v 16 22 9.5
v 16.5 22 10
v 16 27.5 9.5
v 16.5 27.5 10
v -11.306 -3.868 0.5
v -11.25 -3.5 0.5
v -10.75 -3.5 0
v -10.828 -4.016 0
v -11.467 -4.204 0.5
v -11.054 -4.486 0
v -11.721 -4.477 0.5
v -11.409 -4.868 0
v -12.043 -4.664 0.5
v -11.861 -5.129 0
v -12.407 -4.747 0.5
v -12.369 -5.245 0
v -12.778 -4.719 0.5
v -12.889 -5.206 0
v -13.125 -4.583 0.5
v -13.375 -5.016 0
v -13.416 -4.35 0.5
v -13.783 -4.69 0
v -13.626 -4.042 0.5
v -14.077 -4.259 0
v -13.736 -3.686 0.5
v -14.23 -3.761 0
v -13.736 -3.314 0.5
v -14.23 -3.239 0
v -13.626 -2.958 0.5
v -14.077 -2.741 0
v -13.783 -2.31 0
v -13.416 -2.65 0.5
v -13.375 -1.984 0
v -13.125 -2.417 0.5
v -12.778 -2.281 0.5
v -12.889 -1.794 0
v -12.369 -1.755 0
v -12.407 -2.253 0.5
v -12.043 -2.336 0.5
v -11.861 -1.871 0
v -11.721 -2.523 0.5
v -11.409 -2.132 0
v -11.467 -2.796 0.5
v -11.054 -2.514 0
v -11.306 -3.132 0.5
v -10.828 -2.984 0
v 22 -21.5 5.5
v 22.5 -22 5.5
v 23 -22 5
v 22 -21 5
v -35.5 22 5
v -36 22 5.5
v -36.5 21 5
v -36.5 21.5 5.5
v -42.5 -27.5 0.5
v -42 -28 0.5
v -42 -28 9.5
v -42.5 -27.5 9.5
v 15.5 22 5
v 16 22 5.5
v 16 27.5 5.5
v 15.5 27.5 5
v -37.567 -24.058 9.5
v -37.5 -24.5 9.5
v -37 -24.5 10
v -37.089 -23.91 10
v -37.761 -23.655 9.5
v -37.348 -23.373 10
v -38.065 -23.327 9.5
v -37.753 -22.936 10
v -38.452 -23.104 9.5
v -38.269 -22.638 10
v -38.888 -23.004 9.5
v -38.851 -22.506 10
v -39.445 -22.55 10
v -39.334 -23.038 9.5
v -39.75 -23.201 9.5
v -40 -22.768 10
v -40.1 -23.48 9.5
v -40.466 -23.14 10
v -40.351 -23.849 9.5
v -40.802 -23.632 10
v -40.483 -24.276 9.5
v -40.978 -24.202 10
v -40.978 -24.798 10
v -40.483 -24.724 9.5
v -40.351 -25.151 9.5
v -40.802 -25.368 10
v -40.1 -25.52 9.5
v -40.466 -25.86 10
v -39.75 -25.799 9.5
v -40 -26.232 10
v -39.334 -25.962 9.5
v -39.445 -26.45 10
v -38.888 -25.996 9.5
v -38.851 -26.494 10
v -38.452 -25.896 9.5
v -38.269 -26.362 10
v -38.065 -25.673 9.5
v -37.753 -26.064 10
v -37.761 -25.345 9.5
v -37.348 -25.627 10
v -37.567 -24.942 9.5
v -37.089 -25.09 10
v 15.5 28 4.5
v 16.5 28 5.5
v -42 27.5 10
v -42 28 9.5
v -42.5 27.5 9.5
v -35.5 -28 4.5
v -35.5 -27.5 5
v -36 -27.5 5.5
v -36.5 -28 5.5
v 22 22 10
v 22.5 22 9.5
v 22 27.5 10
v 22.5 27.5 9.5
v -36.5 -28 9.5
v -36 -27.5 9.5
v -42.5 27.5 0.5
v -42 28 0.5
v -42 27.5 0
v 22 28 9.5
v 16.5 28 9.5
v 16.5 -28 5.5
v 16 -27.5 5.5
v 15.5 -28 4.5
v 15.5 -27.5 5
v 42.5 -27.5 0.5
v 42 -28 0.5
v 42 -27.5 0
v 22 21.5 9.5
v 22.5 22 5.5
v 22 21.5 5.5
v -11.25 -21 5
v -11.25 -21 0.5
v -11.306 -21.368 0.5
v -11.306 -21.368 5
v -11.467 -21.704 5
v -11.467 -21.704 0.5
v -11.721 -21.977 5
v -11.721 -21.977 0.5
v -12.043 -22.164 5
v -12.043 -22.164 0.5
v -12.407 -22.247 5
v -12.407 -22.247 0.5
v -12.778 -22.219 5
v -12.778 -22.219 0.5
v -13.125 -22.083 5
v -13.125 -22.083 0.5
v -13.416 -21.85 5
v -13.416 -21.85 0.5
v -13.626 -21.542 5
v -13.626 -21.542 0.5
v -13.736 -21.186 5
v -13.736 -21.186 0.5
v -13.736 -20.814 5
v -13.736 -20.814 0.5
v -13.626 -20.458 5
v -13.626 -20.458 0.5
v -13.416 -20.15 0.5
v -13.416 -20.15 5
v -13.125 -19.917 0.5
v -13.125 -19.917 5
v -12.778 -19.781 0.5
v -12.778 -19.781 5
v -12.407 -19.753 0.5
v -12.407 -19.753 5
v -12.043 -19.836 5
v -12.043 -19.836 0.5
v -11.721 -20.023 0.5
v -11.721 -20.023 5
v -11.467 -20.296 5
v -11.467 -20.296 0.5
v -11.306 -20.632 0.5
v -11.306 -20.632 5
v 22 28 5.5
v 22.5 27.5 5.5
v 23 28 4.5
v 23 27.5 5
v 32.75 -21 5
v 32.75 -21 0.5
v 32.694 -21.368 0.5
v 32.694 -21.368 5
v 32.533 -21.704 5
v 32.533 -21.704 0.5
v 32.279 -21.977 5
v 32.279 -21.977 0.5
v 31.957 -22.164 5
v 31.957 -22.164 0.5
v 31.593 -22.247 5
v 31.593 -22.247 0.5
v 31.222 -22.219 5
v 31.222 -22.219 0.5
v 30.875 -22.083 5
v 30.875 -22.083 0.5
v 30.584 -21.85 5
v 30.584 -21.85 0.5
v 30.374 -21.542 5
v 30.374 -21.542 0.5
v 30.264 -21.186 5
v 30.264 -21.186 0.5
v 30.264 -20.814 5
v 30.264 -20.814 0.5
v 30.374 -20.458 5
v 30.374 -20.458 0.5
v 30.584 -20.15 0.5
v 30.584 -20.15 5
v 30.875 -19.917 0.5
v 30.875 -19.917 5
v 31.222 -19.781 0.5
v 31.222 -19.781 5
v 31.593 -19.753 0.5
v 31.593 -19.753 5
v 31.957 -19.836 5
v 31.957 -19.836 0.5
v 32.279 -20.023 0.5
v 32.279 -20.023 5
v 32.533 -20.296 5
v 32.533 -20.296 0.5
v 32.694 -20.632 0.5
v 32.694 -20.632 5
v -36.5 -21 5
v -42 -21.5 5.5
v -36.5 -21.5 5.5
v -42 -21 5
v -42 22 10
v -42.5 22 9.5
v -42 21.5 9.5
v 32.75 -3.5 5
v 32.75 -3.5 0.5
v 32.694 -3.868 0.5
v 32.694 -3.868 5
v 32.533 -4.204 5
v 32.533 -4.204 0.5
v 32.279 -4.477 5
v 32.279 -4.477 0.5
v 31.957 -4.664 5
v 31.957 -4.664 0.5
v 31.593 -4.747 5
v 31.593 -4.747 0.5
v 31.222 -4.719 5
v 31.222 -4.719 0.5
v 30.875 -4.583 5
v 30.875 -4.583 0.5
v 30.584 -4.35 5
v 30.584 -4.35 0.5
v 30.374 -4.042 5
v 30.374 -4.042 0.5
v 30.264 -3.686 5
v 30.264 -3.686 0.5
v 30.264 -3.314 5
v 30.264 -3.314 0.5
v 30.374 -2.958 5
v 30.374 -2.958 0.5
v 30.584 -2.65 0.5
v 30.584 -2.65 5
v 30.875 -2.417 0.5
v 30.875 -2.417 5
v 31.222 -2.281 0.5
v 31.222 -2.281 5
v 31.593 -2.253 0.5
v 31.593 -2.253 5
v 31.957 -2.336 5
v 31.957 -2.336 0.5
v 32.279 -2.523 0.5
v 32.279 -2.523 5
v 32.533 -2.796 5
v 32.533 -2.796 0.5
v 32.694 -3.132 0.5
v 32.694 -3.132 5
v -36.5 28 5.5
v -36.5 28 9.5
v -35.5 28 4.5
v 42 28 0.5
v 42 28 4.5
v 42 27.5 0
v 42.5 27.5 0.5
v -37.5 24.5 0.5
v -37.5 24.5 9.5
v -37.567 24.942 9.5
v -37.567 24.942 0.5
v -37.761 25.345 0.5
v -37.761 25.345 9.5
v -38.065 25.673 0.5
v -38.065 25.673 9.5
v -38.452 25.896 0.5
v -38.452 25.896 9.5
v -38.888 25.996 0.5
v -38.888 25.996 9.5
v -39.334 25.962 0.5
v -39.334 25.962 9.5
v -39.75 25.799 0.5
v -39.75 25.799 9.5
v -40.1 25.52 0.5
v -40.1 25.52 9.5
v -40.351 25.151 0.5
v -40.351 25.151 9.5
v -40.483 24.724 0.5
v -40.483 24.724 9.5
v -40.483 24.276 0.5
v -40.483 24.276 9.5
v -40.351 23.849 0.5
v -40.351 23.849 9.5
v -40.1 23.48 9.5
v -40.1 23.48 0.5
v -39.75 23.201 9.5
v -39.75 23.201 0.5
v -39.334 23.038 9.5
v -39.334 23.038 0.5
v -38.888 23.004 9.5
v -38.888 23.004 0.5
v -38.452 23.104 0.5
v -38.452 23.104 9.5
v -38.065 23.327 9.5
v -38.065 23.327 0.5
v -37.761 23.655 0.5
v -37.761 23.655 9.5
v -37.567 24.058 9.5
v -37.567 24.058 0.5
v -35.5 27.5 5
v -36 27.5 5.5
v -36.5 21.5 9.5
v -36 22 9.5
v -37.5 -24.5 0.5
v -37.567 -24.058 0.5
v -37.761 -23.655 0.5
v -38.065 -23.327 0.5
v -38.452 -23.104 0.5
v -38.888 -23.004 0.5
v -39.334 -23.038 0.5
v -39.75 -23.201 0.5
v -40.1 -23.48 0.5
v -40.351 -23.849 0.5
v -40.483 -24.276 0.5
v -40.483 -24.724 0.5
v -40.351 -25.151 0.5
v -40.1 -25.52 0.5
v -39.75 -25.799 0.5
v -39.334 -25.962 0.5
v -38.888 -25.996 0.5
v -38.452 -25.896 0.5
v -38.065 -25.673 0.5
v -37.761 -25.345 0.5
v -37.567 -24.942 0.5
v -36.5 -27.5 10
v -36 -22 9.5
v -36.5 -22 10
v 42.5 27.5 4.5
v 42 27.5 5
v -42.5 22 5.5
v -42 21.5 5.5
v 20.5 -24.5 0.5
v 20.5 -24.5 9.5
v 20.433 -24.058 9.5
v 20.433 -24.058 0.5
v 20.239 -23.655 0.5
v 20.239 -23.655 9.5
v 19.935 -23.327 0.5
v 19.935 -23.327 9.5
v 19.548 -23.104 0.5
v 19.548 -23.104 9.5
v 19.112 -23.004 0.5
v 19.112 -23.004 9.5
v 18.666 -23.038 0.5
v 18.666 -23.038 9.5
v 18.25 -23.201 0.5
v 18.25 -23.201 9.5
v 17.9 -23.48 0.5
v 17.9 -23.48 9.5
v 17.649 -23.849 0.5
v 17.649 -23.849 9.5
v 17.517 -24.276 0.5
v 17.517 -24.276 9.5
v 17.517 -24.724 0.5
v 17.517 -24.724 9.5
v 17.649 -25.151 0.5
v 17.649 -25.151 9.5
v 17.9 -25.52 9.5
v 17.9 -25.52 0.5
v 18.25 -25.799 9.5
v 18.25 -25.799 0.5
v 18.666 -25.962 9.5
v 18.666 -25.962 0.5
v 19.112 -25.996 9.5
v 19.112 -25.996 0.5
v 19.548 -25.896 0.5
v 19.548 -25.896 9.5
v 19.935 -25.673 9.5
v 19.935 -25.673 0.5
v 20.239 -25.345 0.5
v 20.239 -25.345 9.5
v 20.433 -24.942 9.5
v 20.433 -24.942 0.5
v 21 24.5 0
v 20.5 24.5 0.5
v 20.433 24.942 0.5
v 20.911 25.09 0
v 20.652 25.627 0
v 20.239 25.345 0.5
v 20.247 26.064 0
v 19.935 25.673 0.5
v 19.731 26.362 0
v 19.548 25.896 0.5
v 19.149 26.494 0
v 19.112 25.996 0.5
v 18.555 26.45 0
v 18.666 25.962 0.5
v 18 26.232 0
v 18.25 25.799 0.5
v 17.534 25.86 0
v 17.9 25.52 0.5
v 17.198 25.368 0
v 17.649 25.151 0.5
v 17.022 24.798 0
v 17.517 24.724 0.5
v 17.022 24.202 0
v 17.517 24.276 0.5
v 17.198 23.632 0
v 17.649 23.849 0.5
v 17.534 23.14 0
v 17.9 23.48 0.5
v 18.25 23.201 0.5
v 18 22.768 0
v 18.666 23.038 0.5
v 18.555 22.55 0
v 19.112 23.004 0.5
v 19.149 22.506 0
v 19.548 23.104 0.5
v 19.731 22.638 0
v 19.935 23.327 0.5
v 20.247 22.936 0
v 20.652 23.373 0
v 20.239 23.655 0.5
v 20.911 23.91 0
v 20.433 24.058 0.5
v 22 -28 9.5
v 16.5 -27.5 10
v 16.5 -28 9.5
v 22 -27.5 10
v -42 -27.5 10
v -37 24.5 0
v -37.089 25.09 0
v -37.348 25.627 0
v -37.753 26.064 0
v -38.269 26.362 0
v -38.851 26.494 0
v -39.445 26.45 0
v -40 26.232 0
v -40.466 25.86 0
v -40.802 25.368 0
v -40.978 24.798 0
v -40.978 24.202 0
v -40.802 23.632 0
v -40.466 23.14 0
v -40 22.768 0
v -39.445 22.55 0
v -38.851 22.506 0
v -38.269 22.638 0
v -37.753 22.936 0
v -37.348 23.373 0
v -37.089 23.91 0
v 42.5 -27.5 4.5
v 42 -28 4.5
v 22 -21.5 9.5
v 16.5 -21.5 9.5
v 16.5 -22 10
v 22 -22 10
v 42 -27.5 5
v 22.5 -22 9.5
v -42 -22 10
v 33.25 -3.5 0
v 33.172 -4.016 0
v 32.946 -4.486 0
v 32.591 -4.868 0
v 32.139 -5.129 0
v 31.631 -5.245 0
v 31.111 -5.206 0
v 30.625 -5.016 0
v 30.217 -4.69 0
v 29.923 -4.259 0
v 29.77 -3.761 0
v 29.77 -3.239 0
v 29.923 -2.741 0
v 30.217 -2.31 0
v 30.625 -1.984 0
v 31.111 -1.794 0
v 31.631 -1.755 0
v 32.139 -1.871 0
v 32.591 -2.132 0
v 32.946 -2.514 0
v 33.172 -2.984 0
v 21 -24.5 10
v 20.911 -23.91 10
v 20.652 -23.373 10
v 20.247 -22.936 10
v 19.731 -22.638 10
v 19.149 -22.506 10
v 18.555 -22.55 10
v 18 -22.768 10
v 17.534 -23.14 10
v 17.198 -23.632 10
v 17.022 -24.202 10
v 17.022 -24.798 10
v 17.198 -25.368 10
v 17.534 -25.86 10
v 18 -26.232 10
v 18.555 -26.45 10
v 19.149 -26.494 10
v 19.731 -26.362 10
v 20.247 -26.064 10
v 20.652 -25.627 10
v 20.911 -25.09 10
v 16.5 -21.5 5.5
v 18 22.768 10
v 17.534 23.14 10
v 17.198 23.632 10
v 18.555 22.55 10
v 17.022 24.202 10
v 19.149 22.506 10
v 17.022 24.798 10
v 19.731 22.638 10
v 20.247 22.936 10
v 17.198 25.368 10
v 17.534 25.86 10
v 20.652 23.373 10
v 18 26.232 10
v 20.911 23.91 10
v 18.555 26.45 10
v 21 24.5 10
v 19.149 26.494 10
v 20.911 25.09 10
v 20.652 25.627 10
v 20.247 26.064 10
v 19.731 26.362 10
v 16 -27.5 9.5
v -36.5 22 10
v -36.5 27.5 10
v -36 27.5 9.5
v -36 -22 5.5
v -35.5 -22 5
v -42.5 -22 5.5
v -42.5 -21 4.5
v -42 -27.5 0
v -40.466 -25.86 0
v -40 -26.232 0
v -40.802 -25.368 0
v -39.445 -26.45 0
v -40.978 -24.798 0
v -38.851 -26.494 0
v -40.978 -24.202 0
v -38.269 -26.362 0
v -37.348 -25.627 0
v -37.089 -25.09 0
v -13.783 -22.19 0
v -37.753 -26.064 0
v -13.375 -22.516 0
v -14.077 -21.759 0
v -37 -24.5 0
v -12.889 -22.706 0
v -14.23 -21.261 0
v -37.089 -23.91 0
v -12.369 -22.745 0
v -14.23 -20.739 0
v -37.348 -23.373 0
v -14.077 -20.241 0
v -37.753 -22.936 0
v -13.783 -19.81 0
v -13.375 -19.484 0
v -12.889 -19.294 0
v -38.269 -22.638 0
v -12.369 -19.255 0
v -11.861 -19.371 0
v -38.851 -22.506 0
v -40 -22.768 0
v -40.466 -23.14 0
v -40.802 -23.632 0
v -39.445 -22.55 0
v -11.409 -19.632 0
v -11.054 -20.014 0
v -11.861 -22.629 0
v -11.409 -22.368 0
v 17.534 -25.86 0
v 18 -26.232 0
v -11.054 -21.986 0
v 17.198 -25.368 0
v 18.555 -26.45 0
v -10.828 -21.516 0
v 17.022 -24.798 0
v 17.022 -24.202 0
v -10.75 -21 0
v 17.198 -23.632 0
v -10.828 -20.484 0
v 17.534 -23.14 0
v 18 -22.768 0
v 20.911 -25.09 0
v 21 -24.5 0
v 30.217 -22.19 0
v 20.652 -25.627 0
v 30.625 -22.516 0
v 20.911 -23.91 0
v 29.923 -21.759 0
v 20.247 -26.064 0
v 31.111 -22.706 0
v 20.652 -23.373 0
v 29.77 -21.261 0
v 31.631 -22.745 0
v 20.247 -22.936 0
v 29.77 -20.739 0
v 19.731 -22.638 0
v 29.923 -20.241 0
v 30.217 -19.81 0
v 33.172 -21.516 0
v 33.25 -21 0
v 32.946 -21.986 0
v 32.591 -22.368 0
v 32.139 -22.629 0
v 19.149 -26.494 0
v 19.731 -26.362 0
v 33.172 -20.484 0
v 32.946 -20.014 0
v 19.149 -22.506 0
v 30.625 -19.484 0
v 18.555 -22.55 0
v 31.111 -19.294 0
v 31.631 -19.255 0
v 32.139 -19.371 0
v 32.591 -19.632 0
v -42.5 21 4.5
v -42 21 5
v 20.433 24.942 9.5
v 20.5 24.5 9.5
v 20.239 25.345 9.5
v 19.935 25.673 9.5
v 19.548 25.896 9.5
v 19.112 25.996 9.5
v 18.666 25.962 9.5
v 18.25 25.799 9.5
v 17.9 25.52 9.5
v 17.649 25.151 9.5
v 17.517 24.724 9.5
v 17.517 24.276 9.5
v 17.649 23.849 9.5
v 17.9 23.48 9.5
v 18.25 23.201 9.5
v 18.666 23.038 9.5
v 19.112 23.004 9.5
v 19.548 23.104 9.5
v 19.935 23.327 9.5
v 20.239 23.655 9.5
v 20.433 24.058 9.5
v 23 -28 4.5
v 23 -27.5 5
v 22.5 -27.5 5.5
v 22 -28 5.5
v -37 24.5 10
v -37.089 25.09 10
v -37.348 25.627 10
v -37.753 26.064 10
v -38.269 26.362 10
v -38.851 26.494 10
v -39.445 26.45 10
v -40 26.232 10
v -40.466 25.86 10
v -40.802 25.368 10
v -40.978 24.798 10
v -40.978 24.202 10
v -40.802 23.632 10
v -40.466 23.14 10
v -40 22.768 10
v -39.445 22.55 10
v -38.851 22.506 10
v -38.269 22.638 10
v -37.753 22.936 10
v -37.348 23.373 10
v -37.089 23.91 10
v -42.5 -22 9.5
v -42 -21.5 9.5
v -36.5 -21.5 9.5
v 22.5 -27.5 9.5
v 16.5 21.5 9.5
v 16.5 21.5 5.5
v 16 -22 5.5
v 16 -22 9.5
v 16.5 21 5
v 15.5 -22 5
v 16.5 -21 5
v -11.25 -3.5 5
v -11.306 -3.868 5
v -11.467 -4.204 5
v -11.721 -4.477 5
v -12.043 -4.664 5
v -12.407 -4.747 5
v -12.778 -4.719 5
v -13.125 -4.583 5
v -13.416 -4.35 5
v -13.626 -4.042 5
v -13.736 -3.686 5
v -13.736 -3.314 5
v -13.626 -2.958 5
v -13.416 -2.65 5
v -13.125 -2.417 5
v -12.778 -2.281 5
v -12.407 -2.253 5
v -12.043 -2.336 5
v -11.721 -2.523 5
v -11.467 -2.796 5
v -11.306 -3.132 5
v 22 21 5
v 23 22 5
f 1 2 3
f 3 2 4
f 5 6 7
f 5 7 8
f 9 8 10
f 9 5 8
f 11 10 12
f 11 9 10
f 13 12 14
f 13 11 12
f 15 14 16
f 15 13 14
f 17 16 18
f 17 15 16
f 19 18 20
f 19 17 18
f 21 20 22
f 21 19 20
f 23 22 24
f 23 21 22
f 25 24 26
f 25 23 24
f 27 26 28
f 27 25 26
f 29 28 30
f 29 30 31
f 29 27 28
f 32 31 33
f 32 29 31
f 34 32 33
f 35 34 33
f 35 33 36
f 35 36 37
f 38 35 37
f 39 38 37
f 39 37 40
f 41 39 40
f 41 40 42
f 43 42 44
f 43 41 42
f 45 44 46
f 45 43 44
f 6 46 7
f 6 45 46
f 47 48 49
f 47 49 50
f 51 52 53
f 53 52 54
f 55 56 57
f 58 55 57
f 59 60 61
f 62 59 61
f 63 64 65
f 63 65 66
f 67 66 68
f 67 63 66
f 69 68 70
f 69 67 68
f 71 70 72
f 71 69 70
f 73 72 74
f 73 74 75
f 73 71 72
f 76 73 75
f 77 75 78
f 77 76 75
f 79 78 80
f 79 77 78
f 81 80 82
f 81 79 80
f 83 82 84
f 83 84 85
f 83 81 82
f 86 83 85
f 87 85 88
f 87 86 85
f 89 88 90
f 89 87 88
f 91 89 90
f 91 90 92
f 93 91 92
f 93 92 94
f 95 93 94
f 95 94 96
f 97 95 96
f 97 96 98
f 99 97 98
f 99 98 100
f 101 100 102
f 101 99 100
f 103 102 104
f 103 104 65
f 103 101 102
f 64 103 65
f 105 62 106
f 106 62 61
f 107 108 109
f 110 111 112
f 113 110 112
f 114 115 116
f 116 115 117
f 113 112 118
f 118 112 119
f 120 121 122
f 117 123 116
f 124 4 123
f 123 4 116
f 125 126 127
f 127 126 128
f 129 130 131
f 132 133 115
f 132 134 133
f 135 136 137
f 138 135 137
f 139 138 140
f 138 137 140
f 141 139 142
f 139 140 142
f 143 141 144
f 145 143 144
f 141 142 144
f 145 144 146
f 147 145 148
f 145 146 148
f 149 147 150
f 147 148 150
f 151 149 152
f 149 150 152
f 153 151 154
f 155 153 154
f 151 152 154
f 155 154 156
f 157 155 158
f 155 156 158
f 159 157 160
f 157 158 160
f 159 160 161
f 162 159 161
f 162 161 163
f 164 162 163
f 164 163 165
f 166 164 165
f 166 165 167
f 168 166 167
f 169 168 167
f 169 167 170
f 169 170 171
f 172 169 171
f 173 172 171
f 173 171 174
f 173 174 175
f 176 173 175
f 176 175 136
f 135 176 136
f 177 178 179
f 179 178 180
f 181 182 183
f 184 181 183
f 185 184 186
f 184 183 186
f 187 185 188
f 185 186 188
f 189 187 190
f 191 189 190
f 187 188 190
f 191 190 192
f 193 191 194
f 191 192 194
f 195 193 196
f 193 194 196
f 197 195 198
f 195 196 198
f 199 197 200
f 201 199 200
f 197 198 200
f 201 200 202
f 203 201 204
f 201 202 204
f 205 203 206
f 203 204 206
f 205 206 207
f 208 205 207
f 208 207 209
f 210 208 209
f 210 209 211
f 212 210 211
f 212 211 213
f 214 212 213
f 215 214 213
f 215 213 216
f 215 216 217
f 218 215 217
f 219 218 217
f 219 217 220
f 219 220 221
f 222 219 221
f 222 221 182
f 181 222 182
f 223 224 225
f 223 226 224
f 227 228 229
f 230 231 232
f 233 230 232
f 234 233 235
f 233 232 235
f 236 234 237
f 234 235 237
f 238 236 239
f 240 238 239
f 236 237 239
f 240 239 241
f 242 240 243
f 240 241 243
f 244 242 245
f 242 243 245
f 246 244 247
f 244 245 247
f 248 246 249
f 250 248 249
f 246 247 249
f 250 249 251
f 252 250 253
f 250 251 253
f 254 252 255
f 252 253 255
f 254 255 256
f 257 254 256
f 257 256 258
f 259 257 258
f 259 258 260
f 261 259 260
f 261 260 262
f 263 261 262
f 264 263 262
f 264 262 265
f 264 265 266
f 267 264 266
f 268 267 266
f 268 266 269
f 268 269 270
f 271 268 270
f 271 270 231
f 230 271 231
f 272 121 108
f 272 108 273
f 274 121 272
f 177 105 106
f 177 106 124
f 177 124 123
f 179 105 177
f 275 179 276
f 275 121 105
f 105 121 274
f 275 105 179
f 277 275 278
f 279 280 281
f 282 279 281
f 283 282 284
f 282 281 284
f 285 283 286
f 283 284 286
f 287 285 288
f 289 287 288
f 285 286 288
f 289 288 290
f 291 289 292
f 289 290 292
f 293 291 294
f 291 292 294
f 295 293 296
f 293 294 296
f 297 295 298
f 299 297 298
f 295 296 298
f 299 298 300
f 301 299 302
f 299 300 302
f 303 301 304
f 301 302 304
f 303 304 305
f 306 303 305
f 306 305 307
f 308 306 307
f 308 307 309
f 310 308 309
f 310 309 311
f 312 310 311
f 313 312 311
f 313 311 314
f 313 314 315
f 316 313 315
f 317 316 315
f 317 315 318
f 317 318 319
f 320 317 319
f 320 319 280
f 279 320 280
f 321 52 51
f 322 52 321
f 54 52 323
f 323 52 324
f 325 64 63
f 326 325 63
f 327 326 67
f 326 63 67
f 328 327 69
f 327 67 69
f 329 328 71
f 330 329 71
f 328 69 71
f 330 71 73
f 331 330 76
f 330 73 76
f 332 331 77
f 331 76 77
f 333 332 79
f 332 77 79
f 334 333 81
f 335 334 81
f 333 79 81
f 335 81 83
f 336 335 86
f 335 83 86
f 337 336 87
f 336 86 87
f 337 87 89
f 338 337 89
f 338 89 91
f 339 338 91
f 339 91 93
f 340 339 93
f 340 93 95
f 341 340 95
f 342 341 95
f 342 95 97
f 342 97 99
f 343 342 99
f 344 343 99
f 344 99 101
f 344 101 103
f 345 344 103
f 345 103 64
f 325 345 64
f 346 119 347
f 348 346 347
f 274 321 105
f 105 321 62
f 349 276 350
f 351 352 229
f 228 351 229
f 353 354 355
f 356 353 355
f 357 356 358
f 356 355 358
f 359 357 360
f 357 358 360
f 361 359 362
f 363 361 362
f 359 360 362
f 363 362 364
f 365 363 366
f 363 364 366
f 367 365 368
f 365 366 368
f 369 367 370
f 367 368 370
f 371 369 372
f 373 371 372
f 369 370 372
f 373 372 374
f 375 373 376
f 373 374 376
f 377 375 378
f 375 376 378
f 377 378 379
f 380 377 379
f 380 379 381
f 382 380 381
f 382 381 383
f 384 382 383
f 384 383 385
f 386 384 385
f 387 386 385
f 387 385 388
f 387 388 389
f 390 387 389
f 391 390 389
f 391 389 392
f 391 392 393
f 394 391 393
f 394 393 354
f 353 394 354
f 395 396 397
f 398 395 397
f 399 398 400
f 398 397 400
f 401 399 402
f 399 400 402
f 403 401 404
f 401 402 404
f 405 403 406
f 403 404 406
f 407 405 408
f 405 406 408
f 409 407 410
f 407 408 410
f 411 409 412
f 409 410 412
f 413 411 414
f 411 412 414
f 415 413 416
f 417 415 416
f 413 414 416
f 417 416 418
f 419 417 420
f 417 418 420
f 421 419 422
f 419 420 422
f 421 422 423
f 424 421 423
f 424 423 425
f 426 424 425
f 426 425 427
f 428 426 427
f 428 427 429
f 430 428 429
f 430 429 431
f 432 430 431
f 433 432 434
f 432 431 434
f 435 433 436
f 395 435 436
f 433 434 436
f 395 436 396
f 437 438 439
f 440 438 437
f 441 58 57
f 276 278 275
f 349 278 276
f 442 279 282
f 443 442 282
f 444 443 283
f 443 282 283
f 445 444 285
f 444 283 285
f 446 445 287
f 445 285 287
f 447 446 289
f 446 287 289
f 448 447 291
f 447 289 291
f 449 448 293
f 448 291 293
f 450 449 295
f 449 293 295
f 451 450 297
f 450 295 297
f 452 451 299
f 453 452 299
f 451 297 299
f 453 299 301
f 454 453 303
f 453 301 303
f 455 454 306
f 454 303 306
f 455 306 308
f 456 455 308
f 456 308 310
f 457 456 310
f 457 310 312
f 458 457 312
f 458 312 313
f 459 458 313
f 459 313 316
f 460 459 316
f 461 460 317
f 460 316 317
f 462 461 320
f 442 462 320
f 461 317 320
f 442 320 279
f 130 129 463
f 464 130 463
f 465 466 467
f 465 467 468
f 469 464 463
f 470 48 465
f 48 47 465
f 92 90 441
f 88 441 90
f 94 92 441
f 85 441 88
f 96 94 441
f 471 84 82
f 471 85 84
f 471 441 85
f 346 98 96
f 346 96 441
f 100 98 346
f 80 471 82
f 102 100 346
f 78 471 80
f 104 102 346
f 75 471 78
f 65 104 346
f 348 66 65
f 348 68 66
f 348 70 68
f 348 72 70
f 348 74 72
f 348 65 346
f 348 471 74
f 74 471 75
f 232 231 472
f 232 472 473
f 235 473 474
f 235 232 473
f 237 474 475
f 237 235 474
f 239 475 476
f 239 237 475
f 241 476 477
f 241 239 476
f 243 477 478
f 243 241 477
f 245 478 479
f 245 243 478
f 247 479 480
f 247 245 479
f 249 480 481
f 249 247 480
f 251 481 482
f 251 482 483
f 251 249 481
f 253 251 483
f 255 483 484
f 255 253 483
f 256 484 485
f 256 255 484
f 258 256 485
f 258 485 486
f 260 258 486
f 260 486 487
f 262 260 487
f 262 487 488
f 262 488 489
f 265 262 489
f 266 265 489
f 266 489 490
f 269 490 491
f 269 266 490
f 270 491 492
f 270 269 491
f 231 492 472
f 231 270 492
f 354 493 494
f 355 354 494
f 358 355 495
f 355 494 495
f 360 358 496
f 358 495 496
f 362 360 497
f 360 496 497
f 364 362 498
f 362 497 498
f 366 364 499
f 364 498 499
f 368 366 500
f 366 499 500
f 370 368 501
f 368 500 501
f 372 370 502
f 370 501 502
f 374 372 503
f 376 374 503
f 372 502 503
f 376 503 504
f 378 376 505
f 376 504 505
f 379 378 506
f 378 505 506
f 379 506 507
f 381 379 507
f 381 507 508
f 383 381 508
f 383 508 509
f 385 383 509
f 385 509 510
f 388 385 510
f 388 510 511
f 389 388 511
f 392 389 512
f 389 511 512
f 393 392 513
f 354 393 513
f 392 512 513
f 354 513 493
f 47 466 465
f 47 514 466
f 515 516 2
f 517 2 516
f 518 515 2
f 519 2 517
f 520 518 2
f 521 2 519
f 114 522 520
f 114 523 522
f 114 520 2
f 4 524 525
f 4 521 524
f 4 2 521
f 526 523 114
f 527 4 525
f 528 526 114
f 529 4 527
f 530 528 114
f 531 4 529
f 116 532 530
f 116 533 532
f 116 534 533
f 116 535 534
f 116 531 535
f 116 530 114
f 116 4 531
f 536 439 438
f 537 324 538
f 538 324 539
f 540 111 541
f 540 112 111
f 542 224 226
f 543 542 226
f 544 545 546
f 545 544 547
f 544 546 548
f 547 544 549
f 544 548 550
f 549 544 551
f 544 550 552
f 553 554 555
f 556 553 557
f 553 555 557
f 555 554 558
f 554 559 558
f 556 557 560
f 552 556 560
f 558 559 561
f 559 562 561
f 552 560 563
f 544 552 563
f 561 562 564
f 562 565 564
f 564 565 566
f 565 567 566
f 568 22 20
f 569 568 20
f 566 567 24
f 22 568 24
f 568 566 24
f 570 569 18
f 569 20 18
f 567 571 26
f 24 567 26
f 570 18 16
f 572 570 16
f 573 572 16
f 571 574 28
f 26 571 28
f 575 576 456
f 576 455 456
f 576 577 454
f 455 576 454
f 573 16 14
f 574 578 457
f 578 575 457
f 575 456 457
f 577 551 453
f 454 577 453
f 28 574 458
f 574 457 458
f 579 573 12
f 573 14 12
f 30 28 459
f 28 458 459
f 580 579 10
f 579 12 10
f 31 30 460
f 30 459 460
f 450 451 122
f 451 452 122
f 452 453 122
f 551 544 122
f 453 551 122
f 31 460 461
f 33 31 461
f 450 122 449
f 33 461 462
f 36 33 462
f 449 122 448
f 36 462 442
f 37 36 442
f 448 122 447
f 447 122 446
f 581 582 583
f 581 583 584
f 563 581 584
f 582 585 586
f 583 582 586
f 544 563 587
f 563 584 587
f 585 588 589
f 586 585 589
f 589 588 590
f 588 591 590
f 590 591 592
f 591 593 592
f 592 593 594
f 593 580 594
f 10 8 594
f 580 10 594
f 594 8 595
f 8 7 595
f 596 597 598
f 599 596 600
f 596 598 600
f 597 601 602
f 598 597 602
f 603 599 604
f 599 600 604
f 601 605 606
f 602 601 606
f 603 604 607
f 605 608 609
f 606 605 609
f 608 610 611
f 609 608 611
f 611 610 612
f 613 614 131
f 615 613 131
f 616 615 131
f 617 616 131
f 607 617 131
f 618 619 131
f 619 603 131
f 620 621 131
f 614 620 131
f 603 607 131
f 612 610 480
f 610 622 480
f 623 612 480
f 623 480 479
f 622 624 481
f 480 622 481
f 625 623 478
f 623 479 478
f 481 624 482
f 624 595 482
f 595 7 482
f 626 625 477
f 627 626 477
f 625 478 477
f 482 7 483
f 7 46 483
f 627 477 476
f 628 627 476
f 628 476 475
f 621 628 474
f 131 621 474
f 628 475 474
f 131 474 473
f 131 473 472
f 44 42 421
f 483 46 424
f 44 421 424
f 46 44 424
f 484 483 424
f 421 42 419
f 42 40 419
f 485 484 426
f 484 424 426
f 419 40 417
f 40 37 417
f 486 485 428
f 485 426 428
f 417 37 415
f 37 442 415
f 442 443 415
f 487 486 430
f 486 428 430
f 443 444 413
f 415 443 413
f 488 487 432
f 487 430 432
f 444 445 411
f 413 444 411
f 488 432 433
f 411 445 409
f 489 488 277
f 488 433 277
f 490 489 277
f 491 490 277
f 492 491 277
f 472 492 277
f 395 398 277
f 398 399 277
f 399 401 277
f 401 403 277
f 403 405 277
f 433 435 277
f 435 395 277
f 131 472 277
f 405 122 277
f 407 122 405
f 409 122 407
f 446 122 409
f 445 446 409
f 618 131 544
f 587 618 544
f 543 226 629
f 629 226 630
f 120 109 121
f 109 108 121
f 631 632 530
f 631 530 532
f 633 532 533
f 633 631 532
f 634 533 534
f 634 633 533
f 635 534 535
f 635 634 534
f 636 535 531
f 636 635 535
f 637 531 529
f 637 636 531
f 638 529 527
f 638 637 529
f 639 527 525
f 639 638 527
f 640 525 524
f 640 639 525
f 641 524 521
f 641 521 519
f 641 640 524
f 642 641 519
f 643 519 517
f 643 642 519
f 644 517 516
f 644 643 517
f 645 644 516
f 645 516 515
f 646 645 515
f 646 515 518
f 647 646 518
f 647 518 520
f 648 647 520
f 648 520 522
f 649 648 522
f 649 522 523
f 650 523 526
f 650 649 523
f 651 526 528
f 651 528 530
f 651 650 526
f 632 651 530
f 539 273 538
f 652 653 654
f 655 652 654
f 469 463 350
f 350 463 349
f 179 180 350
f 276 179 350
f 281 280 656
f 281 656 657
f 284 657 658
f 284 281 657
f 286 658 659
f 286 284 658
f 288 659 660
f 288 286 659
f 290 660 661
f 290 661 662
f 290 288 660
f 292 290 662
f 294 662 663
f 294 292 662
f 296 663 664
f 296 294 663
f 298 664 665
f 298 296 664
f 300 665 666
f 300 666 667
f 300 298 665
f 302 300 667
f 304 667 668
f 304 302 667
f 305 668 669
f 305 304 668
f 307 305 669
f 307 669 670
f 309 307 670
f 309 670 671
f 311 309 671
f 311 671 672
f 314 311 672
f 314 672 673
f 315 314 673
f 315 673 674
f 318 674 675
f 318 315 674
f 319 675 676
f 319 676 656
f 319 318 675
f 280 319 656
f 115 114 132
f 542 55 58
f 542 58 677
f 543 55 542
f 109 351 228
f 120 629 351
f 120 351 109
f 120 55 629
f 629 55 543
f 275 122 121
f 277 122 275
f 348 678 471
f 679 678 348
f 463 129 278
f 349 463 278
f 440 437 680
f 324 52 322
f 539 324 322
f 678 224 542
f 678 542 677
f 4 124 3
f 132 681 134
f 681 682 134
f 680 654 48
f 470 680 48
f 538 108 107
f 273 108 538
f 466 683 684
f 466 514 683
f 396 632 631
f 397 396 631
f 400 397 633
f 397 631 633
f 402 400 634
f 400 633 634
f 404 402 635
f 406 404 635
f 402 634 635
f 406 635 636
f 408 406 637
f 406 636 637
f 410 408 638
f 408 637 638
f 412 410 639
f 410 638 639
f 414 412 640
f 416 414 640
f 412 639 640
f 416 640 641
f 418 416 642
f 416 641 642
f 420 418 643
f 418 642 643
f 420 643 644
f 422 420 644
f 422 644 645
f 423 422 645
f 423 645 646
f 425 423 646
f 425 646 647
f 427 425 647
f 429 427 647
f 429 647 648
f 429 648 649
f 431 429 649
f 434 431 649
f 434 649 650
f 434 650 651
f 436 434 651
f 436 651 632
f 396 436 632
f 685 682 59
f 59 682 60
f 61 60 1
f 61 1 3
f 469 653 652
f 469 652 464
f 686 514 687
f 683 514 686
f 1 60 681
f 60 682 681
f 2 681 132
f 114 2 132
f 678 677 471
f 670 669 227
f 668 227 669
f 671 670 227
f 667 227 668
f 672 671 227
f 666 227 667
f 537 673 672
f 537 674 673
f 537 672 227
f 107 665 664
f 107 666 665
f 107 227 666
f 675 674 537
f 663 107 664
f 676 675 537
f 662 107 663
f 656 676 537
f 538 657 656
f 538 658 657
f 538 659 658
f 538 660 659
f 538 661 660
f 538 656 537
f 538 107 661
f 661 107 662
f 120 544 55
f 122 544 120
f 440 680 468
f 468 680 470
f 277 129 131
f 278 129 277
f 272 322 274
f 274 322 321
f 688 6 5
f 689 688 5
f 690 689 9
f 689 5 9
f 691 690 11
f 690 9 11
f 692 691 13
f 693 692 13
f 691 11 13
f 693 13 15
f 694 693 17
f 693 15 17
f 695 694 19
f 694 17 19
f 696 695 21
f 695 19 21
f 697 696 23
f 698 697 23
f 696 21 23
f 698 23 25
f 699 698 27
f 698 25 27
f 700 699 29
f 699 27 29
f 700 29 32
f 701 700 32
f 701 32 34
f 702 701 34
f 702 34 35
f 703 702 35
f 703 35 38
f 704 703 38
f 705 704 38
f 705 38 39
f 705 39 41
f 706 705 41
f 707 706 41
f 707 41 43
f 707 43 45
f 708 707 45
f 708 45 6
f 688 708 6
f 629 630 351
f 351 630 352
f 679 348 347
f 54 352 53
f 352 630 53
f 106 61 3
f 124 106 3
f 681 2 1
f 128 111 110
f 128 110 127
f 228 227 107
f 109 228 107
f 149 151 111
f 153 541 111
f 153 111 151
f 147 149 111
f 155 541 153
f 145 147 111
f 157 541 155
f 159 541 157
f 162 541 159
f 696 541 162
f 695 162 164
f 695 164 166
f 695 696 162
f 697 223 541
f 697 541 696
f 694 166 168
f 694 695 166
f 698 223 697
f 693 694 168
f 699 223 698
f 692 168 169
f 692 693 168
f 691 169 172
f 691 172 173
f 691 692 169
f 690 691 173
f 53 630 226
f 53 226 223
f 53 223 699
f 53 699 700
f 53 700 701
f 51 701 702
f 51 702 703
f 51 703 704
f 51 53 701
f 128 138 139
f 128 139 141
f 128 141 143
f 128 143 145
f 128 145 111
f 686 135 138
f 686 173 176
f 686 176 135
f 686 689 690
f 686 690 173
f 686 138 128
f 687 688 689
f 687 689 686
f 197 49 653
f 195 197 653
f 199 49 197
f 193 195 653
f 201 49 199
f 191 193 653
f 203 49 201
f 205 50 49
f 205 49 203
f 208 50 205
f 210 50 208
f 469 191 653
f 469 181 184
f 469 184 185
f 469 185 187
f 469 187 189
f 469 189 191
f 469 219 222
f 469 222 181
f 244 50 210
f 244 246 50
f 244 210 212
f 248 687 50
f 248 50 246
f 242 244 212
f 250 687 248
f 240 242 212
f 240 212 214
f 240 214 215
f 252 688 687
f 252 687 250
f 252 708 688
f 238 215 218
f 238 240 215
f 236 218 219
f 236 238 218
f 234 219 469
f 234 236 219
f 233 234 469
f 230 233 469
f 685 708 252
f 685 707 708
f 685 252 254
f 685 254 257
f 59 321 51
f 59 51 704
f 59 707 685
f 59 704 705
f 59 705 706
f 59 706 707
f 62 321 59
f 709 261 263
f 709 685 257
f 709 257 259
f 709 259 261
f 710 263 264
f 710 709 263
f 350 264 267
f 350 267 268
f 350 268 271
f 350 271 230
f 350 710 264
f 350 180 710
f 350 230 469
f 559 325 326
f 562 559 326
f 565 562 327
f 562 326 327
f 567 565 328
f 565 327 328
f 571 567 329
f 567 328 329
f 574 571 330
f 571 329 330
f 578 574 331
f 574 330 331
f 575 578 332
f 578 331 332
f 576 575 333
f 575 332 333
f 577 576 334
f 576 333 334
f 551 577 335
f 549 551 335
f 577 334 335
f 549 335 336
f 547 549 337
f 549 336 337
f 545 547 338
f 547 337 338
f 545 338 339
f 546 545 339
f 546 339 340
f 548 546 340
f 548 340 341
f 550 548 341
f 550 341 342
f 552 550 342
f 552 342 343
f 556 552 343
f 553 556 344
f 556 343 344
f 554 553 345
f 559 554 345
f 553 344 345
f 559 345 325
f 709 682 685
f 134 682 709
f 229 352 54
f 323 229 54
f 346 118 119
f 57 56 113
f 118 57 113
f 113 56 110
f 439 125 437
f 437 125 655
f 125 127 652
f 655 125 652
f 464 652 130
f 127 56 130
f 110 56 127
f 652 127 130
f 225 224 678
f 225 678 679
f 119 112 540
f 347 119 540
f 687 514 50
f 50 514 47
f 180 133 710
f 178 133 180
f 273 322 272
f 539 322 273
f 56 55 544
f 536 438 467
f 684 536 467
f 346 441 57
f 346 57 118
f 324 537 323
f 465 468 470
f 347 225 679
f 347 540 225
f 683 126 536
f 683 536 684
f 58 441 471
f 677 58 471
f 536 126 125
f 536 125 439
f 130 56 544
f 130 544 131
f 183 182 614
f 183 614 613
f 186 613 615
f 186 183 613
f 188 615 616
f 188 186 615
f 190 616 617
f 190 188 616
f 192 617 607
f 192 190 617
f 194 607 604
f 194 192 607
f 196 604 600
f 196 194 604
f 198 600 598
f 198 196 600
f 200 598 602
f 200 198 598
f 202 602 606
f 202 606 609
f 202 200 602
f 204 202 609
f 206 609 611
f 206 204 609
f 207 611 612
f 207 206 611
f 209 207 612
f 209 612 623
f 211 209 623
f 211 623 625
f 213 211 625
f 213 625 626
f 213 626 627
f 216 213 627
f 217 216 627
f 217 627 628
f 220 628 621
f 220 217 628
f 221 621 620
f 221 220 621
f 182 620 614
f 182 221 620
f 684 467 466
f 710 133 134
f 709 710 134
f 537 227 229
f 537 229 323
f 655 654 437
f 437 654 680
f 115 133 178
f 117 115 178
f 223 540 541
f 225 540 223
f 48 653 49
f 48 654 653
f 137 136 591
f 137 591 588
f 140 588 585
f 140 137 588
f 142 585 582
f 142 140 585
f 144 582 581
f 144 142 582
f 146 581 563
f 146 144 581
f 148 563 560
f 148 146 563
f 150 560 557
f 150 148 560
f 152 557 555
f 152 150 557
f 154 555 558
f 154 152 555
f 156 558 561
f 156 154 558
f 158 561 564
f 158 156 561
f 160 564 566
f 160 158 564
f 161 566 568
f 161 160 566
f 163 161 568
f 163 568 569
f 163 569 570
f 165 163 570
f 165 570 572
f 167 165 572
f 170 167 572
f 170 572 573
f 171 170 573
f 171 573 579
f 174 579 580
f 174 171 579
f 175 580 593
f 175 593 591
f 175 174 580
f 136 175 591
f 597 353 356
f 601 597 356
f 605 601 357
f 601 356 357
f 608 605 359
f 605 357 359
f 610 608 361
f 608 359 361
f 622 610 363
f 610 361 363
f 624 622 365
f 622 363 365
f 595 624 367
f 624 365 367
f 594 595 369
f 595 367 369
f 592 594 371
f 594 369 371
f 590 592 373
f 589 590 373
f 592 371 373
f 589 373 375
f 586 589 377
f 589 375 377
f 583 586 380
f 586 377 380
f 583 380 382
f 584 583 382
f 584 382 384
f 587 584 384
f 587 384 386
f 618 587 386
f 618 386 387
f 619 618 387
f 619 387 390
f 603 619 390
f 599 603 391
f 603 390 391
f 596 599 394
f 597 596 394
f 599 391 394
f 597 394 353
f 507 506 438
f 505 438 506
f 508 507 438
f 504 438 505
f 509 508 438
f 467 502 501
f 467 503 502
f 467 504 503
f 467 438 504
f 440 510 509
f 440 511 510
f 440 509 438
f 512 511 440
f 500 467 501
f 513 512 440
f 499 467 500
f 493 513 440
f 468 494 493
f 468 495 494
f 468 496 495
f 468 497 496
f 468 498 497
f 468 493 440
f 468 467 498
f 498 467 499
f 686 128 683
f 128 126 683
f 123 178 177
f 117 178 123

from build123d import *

# Parameters (mm, degrees)
SKETCH_W        = 85
SKETCH_H        = 56
PAD_DEPTH       = 5
SKETCH001_W     = 6.5
SKETCH001_H     = 6.5
PAD001_DEPTH    = 5
SKETCH002_R     = 1.5
POCKET_DEPTH    = 10.001
SKETCH003_R     = 1.25
POCKET001_DEPTH = 10.001
CHAMFER_SIZE    = 0.5


with BuildPart() as part:
    # Sketch (on XY_Plane of Origin) → Pad (new body)
    with BuildSketch(Plane.XY):
        Rectangle(SKETCH_W, SKETCH_H)
    extrude(amount=PAD_DEPTH)

    # Sketch001 (on Face6 of Pad) → Pad001 (join)
    with BuildSketch(Plane.XY.offset(5)):
        with Locations((-39.25, 24.75)):
            Rectangle(SKETCH001_W, SKETCH001_H)
        with Locations((-39.25, -24.75)):
            Rectangle(SKETCH001_W, SKETCH001_H)
        with Locations((19.25, 24.75)):
            Rectangle(SKETCH001_W, SKETCH001_H)
        with Locations((19.25, -24.75)):
            Rectangle(SKETCH001_W, SKETCH001_H)
    extrude(amount=PAD001_DEPTH)

    # Sketch002 (on Face5 of Pad001) → Pocket (cut, through all)
    with BuildSketch(Plane.XY.offset(10)):
        with Locations((-39, 24.5)):
            Circle(SKETCH002_R)
        with Locations((-39, -24.5)):
            Circle(SKETCH002_R)
        with Locations((19, 24.5)):
            Circle(SKETCH002_R)
        with Locations((19, -24.5)):
            Circle(SKETCH002_R)
    extrude(amount=-POCKET_DEPTH, mode=Mode.SUBTRACT)

    # Sketch003 (on Face1 of Pocket) → Pocket001 (cut, through all)
    with BuildSketch(Plane(origin=(0, 0, 0), x_dir=(1, 0, 0), z_dir=(0, 0, -1))):
        with Locations((31.5, 21)):
            Circle(SKETCH003_R)
        with Locations((31.5, 3.5)):
            Circle(SKETCH003_R)
        with Locations((-12.5, 21)):
            Circle(SKETCH003_R)
        with Locations((-12.5, 3.5)):
            Circle(SKETCH003_R)
    extrude(amount=-POCKET001_DEPTH, mode=Mode.SUBTRACT)

    # Chamfer
    chamfer_edges = [part.edges().sort_by_distance(p)[0] for p in [
        (42.5, 28, 2.5),
        (0, 28, 0),
        (-42.5, 28, 5),
        (-39.25, 28, 10),
        (-36, 28, 7.5),
        (-10, 28, 5),
        (16, 28, 7.5),
        (19.25, 28, 10),
        (22.5, 28, 7.5),
        (32.5, 28, 5),
        (-42.5, 0, 0),
        (-42.5, -28, 5),
        (-42.5, -24.75, 10),
        (-42.5, -21.5, 7.5),
        (-42.5, 0, 5),
        (-42.5, 21.5, 7.5),
        (-42.5, 24.75, 10),
        (0, -28, 0),
        (42.5, -28, 2.5),
        (32.5, -28, 5),
        (22.5, -28, 7.5),
        (19.25, -28, 10),
        (16, -28, 7.5),
        (-10, -28, 5),
        (-36, -28, 7.5),
        (-39.25, -28, 10),
        (42.5, 0, 0),
        (42.5, 0, 5),
        (-36, -24.75, 10),
        (-39.25, -21.5, 10),
        (-40.5, -24.5, 10),
        (-39.25, 21.5, 10),
        (-36, 24.75, 10),
        (-40.5, 24.5, 10),
        (16, 24.75, 10),
        (19.25, 21.5, 10),
        (22.5, 24.75, 10),
        (17.5, 24.5, 10),
        (16, -24.75, 10),
        (22.5, -24.75, 10),
        (19.25, -21.5, 10),
        (17.5, -24.5, 10),
        (22.5, -21.5, 7.5),
        (22.5, -24.75, 5),
        (16, -21.5, 7.5),
        (19.25, -21.5, 5),
        (16, -24.75, 5),
        (-36, -21.5, 7.5),
        (-36, -24.75, 5),
        (-39.25, -21.5, 5),
        (-36, 21.5, 7.5),
        (-36, 24.75, 5),
        (-39.25, 21.5, 5),
        (22.5, 21.5, 7.5),
        (22.5, 24.75, 5),
        (16, 21.5, 7.5),
        (19.25, 21.5, 5),
        (16, 24.75, 5),
        (17.5, -24.5, 0),
        (-40.5, -24.5, 0),
        (-13.75, -21, 0),
        (-13.75, -3.5, 0),
        (30.25, -3.5, 0),
        (30.25, -21, 0),
        (17.5, 24.5, 0),
        (-40.5, 24.5, 0),
    ]]
    chamfer(chamfer_edges, length=CHAMFER_SIZE)


solid = part.part
